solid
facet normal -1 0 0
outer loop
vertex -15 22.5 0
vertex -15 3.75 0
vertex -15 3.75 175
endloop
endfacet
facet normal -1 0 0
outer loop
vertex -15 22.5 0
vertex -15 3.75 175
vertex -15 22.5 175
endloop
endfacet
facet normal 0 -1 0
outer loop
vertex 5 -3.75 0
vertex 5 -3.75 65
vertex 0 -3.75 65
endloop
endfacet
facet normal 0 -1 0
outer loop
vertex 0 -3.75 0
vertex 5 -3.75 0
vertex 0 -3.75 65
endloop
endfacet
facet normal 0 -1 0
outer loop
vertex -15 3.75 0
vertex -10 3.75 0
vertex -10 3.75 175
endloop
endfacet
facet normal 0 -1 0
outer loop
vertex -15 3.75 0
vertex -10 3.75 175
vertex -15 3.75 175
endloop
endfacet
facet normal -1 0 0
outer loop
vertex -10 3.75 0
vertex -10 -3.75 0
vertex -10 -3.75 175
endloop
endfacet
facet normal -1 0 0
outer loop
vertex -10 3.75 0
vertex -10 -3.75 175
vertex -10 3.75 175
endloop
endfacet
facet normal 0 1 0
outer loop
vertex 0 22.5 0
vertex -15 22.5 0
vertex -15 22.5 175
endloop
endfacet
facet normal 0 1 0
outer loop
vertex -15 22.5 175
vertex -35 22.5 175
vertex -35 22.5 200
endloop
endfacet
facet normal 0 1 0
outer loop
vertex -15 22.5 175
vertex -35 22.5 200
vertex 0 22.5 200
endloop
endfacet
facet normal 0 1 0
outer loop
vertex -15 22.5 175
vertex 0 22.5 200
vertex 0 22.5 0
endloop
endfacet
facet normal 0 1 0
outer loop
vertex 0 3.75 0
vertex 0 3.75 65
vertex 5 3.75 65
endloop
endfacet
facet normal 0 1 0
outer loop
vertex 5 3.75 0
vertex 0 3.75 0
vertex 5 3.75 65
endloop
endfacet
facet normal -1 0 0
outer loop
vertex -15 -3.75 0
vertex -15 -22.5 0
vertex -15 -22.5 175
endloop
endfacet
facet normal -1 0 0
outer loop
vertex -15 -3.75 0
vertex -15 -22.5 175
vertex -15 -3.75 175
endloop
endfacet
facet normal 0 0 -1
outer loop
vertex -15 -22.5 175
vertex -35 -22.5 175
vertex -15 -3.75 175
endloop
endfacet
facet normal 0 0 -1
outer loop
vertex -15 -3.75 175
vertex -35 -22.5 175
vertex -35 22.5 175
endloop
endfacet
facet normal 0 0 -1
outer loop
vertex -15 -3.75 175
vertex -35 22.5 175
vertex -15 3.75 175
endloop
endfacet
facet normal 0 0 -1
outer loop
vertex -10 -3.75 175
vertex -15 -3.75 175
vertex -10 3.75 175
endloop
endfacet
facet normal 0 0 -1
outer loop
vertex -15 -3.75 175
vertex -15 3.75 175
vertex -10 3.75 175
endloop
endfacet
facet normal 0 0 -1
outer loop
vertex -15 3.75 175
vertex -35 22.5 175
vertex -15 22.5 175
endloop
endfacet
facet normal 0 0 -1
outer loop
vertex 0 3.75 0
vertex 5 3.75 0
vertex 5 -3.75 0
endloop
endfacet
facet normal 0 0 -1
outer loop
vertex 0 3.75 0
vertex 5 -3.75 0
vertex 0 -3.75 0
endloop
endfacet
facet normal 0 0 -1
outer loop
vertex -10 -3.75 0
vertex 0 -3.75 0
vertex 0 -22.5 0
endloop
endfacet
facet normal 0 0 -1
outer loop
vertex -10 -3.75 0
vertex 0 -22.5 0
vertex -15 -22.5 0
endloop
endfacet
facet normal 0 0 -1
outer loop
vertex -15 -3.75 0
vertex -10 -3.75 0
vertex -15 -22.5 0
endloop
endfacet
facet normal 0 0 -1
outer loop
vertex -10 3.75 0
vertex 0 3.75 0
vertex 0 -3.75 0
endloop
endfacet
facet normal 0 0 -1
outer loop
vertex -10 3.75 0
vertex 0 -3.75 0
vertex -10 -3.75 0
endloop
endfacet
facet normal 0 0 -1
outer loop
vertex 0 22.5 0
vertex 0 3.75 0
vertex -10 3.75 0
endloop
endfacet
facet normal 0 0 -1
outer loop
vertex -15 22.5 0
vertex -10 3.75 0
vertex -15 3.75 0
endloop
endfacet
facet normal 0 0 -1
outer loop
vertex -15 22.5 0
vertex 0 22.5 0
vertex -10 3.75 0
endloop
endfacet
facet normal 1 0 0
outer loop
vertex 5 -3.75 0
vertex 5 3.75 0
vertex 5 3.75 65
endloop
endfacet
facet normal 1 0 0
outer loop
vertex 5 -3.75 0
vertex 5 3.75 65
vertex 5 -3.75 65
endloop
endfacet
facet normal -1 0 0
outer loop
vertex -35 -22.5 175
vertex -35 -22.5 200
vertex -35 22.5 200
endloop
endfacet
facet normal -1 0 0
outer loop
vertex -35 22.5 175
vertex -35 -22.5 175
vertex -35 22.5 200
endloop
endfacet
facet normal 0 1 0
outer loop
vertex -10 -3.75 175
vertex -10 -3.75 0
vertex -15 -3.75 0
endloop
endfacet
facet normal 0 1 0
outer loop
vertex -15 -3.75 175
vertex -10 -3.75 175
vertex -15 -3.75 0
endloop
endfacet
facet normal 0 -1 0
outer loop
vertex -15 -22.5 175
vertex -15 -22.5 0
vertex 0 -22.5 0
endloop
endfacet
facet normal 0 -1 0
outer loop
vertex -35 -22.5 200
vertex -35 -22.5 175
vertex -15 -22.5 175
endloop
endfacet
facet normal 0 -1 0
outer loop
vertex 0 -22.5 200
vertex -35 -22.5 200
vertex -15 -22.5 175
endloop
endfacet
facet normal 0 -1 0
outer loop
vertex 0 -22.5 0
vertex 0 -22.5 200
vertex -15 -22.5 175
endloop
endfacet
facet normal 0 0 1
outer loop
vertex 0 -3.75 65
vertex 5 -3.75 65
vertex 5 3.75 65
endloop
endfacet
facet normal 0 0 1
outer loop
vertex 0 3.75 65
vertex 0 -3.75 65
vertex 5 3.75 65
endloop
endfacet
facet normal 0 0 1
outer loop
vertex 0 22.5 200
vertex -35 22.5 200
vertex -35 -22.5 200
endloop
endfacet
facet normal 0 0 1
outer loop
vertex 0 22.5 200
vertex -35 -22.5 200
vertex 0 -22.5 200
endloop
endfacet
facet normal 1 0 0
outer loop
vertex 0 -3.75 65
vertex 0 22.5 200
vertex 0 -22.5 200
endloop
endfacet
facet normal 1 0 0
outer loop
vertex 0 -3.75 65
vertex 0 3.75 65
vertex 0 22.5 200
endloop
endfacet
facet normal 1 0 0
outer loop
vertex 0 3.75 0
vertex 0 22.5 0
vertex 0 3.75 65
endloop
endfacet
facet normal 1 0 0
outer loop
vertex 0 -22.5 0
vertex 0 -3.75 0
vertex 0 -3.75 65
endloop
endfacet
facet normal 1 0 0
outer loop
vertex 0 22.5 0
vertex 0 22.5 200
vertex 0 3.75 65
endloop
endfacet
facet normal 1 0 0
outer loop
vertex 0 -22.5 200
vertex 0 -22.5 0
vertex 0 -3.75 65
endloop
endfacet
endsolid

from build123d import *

# Parameters (mm, degrees)
BOSS_EXTRUDE3_DEPTH = 200
SKETCH5_W           = 135
SKETCH5_H           = 7.5
CUT_EXTRUDE1_DEPTH  = 5
SKETCH6_W           = 20
SKETCH6_H           = 45
BOSS_EXTRUDE4_DEPTH = 25
SKETCH7_W           = 5
SKETCH7_H           = 7.5
CUT_EXTRUDE2_DEPTH  = 175


with BuildPart() as part:
    # Sketch4 → Boss-Extrude3 (new body)
    with BuildSketch(Plane.XY):
        Polygon((5, -3.75), (0, -3.75), (0, -22.5), (-15, -22.5), (-15, 22.5), (0, 22.5), (0, 3.75), (5, 3.75), align=None)
    extrude(amount=BOSS_EXTRUDE3_DEPTH)

    # Sketch5 → Cut-Extrude1 (cut)
    with BuildSketch(Plane(origin=(5, 0, 0), x_dir=(0, 0, -1), z_dir=(1, 0, 0))):
        with Locations((-132.5, 0)):
            Rectangle(SKETCH5_W, SKETCH5_H)
    extrude(amount=-CUT_EXTRUDE1_DEPTH, mode=Mode.SUBTRACT)

    # Sketch6 → Boss-Extrude4 (add)
    with BuildSketch(Plane.XY.offset(200)):
        with Locations((-25, 0)):
            Rectangle(SKETCH6_W, SKETCH6_H)
    extrude(amount=-BOSS_EXTRUDE4_DEPTH)

    # Sketch7 → Cut-Extrude2 (cut)
    with BuildSketch(Plane(origin=(0, 0, 0), x_dir=(-1, 0, 0), z_dir=(0, 0, -1))):
        with Locations((12.5, 0)):
            Rectangle(SKETCH7_W, SKETCH7_H)
    extrude(amount=-CUT_EXTRUDE2_DEPTH, mode=Mode.SUBTRACT)


solid = part.part
